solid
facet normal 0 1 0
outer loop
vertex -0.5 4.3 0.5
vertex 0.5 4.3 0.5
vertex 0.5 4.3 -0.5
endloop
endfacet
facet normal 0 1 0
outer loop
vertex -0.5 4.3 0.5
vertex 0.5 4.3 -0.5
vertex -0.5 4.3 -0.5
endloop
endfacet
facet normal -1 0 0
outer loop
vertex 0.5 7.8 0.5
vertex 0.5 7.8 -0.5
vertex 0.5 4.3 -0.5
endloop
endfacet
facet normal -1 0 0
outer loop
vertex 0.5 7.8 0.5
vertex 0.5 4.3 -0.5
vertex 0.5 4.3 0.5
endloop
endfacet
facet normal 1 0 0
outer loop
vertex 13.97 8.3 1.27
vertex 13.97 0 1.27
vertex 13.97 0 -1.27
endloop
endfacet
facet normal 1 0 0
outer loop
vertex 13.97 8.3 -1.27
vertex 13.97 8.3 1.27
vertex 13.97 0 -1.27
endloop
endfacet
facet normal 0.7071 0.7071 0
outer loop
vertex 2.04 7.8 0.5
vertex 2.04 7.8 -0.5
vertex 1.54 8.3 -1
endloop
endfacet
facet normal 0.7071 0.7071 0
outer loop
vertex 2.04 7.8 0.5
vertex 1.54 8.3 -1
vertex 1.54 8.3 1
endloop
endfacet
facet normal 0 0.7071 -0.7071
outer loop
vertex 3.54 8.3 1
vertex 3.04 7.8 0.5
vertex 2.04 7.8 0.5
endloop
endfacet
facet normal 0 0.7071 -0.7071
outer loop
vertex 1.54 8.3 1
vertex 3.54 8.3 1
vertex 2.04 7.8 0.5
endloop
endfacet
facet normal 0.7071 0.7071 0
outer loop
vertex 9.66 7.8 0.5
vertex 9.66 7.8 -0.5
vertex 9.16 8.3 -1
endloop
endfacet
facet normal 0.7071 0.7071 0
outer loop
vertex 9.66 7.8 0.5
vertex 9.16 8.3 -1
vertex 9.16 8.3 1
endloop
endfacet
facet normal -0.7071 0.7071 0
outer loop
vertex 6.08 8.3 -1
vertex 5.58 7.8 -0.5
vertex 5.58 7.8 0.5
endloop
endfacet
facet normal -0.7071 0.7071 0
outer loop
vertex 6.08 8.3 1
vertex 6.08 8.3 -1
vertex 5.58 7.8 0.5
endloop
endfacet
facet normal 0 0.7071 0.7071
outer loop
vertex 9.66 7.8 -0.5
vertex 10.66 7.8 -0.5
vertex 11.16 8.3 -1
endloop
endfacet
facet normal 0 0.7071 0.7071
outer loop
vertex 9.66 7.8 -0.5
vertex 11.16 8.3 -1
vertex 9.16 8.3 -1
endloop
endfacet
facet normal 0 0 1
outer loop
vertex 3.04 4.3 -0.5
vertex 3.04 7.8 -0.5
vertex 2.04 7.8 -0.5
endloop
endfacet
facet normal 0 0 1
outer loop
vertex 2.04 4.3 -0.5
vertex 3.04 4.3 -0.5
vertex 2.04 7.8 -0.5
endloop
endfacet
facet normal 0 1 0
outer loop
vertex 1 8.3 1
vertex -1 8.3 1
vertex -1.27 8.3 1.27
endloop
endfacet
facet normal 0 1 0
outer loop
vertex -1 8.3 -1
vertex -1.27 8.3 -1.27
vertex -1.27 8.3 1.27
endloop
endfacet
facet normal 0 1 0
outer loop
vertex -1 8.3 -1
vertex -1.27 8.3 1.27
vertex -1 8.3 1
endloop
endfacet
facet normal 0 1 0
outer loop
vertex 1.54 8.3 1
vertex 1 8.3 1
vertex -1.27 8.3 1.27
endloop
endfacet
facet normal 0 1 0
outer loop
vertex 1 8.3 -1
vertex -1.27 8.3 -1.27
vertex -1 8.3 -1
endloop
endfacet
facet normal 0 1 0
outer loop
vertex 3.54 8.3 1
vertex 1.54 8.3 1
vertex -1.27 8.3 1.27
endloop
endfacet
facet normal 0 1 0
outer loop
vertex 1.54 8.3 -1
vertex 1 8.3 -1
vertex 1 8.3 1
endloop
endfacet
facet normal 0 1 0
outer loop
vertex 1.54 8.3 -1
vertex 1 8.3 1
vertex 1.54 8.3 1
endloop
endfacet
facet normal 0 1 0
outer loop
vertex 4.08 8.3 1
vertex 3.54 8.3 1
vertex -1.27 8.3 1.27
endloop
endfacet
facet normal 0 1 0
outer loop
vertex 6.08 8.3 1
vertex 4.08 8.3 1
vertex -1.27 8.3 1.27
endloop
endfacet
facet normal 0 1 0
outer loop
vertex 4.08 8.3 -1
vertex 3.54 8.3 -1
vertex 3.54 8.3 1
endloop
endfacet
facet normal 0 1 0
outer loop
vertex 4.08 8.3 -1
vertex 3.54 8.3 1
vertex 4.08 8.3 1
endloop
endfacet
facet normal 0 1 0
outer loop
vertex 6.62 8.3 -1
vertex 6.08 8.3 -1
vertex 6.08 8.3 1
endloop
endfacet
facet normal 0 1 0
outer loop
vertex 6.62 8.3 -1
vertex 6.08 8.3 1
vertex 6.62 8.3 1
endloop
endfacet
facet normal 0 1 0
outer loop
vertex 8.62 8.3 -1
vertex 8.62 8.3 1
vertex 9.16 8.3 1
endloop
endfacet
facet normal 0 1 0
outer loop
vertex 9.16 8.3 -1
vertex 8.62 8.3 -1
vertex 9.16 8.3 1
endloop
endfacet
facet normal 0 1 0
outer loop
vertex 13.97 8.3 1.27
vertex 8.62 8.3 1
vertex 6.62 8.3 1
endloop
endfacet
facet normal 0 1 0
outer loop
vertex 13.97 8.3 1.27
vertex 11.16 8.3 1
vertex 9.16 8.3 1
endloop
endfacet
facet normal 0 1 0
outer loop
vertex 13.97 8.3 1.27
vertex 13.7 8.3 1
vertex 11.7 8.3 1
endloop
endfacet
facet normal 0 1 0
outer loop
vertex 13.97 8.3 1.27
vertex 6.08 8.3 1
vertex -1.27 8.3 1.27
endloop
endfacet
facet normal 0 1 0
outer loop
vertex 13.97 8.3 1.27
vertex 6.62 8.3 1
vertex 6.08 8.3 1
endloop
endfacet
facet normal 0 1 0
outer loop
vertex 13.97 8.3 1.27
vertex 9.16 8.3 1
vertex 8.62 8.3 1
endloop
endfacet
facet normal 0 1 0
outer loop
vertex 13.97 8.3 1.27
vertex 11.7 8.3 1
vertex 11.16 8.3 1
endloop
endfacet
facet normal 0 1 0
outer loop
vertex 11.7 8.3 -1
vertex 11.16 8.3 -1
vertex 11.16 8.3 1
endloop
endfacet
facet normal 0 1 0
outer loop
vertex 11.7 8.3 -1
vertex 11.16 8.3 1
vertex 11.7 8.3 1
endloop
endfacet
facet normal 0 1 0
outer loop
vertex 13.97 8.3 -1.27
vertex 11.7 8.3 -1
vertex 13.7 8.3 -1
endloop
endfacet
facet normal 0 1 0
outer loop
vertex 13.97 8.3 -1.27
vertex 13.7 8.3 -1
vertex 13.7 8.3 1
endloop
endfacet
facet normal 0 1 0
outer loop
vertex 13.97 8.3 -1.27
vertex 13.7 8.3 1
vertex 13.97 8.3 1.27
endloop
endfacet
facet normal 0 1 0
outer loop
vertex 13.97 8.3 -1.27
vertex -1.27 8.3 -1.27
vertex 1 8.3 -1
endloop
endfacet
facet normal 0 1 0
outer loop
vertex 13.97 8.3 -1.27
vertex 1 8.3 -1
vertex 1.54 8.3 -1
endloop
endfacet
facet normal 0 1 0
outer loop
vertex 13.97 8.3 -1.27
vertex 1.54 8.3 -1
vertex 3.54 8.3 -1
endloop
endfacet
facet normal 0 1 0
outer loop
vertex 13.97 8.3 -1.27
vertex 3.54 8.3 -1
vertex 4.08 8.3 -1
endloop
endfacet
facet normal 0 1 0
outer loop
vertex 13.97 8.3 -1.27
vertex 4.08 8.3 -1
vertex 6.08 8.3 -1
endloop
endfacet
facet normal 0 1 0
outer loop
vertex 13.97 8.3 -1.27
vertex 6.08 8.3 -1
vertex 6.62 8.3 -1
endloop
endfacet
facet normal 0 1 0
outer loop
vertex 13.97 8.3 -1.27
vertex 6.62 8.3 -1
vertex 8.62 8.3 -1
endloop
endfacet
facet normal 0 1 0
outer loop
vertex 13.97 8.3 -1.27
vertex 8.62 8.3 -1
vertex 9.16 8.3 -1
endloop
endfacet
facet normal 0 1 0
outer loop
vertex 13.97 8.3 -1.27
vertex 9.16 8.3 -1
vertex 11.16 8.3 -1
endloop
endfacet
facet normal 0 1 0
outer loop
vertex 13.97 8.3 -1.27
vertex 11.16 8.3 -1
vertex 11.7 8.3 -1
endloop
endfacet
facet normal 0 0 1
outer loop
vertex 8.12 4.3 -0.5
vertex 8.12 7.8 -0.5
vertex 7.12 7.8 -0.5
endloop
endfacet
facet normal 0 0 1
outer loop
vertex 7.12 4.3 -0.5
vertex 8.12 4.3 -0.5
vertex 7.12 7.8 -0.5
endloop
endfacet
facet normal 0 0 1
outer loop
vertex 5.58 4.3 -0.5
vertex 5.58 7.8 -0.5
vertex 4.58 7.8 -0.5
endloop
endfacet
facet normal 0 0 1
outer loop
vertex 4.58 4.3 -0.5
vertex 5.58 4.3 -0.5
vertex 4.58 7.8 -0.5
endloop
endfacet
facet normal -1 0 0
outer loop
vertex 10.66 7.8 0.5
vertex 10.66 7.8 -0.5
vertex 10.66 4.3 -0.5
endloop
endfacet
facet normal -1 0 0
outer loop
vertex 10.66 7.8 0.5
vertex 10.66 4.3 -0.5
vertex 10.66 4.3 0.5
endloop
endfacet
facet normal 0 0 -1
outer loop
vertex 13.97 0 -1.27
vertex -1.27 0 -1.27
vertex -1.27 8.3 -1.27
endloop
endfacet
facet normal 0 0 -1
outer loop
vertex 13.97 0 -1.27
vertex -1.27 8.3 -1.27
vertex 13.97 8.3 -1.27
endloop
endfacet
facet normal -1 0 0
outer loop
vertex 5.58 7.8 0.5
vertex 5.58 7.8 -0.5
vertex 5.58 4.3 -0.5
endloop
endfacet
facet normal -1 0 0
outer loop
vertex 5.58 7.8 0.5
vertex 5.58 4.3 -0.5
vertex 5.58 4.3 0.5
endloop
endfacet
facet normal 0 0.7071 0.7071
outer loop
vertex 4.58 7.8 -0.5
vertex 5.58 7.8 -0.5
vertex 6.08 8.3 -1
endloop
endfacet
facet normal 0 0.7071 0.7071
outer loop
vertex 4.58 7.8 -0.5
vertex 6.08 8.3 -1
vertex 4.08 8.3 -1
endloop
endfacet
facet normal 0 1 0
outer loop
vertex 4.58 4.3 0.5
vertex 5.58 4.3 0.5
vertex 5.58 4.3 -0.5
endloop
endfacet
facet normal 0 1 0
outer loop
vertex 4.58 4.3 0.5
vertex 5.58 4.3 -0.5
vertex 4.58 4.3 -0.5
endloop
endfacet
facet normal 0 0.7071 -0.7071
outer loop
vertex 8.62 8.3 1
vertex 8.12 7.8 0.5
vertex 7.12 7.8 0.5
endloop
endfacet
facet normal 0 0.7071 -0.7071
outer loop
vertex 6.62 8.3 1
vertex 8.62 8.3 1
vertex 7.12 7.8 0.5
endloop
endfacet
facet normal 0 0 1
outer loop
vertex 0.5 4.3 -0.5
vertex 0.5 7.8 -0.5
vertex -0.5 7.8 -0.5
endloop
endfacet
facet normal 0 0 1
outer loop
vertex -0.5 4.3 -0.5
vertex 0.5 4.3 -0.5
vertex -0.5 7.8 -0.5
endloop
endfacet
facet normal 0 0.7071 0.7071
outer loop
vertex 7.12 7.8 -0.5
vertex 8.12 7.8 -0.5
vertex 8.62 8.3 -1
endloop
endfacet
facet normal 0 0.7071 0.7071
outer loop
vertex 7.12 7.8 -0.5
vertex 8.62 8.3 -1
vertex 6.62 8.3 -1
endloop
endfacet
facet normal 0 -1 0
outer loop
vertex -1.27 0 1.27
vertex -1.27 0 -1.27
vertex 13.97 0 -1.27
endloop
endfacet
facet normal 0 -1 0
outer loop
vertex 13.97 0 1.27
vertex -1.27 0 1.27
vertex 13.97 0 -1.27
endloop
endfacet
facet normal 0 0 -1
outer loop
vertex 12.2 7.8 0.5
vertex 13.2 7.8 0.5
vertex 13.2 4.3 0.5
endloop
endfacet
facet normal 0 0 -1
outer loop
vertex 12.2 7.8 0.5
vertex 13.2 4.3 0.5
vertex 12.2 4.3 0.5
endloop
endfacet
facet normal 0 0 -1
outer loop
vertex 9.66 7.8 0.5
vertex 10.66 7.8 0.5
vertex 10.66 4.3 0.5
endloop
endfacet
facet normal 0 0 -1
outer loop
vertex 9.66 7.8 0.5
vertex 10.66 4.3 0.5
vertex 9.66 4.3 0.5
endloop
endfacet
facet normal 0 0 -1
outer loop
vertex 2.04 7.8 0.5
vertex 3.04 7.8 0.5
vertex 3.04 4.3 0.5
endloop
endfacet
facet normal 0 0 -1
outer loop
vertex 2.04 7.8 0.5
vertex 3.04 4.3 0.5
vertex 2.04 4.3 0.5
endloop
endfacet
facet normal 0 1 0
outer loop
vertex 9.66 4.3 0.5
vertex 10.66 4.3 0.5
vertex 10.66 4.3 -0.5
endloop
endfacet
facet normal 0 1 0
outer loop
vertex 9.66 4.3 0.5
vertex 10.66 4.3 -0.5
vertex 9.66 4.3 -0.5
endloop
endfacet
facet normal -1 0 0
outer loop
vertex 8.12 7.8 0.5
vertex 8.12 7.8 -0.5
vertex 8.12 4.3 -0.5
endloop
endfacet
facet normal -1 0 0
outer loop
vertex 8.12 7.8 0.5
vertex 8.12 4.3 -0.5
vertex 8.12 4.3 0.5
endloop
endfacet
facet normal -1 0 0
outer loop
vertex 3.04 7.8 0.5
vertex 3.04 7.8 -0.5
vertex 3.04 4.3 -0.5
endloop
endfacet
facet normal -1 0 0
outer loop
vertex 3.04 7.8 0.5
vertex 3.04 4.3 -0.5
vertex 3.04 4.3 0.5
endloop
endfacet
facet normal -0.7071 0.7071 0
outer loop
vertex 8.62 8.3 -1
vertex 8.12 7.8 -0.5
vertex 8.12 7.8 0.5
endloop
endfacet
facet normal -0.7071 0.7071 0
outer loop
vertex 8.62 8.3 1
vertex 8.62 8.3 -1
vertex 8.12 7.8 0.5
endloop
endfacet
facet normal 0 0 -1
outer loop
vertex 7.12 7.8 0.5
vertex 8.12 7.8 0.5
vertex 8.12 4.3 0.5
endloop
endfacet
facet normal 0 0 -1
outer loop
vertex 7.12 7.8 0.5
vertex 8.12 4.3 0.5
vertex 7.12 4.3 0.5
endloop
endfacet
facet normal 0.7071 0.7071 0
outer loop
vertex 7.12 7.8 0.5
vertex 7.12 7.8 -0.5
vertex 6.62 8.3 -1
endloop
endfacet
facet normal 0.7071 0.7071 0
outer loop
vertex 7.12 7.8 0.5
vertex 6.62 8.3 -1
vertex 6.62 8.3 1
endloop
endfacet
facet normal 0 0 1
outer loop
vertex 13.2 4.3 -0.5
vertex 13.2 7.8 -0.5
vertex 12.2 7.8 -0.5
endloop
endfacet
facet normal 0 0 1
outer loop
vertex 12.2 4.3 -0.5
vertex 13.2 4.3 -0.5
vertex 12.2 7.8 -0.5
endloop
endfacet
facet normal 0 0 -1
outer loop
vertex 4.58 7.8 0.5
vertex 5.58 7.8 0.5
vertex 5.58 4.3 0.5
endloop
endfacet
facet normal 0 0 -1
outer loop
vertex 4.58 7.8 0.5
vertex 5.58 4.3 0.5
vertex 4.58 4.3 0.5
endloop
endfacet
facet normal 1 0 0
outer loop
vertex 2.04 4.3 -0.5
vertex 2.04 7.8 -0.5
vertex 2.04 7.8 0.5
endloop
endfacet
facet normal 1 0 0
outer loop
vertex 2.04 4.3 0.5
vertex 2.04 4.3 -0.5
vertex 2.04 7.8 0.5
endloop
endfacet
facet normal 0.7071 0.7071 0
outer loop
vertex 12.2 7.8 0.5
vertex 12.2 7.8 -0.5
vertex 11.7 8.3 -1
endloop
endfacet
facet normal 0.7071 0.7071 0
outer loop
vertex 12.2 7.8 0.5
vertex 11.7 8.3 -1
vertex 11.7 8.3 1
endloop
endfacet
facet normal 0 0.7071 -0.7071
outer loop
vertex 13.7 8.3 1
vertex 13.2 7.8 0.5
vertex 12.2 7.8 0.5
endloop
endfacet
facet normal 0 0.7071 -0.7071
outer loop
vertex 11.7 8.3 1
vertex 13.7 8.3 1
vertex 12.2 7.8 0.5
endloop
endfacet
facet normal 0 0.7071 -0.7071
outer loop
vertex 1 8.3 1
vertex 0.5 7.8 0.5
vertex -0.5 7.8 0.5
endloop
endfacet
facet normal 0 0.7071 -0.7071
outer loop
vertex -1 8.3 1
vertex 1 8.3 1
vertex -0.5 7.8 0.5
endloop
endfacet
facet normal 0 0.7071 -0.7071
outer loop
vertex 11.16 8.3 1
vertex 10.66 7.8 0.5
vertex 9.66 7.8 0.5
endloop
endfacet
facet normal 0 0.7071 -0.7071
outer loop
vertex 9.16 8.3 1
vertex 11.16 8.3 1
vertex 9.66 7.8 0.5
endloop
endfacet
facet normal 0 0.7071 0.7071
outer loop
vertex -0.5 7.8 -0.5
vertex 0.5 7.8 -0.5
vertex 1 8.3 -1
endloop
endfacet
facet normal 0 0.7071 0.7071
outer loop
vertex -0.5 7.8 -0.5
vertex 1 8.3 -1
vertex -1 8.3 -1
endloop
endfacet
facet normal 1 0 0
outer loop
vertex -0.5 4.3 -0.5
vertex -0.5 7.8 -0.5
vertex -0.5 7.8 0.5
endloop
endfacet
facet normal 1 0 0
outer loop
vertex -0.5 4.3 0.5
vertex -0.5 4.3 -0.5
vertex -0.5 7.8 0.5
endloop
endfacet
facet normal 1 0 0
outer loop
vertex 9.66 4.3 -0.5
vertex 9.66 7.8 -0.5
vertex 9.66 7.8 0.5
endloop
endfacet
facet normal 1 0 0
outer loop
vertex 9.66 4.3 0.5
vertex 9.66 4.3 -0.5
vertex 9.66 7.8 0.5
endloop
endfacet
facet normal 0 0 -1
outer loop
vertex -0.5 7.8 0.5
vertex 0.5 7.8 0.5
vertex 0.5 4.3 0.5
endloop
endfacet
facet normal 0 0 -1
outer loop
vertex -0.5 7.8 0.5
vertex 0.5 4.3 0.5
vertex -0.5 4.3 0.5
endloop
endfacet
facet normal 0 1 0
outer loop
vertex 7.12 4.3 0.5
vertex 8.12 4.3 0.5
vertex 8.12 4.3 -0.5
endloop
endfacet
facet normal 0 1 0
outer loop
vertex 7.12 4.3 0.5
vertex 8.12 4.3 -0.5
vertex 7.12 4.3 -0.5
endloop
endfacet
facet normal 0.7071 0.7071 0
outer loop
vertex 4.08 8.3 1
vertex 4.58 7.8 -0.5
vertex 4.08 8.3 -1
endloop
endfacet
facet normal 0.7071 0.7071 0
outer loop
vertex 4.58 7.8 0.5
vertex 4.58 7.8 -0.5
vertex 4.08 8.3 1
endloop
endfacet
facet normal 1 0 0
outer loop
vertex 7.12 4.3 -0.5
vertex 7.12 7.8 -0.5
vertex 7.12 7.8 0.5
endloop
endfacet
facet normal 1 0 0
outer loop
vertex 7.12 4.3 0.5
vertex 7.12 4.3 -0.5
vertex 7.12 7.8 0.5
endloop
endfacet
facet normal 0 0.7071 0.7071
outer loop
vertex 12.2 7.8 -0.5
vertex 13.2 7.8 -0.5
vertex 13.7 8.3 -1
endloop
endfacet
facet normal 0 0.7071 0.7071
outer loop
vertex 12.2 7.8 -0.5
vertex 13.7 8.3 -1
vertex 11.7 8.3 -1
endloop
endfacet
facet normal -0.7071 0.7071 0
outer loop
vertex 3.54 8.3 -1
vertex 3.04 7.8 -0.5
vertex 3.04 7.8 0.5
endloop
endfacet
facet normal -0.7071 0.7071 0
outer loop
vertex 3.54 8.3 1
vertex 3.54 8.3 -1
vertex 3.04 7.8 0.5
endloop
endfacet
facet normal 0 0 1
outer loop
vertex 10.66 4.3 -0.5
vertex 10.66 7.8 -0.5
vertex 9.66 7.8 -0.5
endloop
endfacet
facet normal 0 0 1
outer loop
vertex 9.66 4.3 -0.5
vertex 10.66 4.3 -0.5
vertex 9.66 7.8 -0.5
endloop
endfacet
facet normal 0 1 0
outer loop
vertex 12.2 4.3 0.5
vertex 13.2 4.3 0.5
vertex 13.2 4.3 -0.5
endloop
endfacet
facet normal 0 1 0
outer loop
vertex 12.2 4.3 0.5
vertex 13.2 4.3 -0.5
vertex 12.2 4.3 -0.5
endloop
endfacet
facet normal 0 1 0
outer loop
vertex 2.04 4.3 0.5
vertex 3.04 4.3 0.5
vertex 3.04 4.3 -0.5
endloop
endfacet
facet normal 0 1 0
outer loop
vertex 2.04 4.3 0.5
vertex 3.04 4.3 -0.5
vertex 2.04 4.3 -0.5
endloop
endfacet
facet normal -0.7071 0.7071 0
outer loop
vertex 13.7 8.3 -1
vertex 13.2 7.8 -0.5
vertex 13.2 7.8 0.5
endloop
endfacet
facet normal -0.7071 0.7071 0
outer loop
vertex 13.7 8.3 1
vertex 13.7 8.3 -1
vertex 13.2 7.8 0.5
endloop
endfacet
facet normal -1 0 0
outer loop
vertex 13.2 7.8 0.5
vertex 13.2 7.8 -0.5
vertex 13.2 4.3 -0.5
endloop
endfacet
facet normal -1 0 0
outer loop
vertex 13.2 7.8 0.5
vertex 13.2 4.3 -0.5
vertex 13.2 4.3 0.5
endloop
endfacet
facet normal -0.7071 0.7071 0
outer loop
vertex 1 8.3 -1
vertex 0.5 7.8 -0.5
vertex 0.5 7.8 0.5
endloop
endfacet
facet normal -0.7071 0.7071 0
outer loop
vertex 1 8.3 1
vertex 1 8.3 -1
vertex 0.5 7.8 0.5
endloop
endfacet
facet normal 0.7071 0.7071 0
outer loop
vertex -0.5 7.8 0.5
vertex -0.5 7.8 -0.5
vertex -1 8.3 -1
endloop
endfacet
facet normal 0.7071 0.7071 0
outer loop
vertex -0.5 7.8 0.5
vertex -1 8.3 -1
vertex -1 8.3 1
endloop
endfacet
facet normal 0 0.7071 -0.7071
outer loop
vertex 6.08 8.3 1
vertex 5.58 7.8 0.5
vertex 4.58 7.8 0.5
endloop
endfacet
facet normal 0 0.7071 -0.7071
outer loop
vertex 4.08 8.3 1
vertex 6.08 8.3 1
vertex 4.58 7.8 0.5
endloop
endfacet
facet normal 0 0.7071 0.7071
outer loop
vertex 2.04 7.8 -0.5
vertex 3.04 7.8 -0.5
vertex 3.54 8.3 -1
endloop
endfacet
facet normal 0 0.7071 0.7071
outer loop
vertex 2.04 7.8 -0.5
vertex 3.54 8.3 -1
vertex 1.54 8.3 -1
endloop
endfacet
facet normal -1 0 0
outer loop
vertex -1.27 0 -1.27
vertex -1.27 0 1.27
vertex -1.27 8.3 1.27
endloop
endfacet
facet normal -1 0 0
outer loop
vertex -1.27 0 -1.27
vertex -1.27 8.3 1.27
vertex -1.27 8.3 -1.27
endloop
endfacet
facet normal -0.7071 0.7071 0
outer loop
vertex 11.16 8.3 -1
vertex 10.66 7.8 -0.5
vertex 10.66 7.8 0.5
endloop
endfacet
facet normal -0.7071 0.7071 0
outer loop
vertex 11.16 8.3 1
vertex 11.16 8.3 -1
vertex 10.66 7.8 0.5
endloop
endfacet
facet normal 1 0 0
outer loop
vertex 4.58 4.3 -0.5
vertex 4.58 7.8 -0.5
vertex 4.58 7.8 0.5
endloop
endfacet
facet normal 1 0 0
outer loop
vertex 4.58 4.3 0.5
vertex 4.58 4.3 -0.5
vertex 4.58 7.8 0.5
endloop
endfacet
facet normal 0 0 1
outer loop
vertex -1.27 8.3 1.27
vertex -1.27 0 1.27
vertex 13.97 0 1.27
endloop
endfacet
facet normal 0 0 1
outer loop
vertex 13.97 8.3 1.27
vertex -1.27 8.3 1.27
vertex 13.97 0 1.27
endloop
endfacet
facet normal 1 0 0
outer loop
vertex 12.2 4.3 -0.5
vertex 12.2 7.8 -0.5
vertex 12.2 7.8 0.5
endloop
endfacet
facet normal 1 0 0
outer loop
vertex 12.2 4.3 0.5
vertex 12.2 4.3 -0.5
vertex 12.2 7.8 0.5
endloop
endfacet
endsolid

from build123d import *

# Parameters (mm, degrees)
SKETCH1_W                  = 2.54
SKETCH1_H                  = 2.54
BOSS_EXTRUDE1_DEPTH        = 8.3
SKETCH2_W                  = 1
SKETCH2_H                  = 1
CUT_EXTRUDE1_DEPTH         = 4
CHAMFER1_SIZE              = 0.5
LPATTERN1_COUNT            = 6
LPATTERN1_PITCH            = 2.54
CHAMFER1_OF_LPATTERN1_SIZE = 0.5


with BuildPart() as part:
    # Sketch1 → Boss-Extrude1 (new body)
    with BuildSketch(Plane(origin=(0, 0, 0), x_dir=(1, 0, 0), z_dir=(0, 1, 0))):
        Rectangle(SKETCH1_W, SKETCH1_H)
    boss_extrude1 = extrude(amount=BOSS_EXTRUDE1_DEPTH)

    # Sketch2 → Cut-Extrude1 (cut)
    with BuildSketch(Plane(origin=(0, 8.3, 0), x_dir=(-1, 0, 0), z_dir=(0, 1, 0))):
        Rectangle(SKETCH2_W, SKETCH2_H)
    cut_extrude1 = extrude(amount=-CUT_EXTRUDE1_DEPTH, mode=Mode.SUBTRACT)

    # Chamfer1
    chamfer1_edges = [part.edges().sort_by_distance(p)[0] for p in [
        (0, 8.3, 0.5),
        (0.5, 8.3, 0),
        (0, 8.3, -0.5),
        (-0.5, 8.3, 0),
    ]]
    chamfer(chamfer1_edges, length=CHAMFER1_SIZE)

    # LPattern1: Boss-Extrude1, Cut-Extrude1 ×6
    with Locations(*[(i * LPATTERN1_PITCH, 0, 0) for i in range(1, LPATTERN1_COUNT)]):
        add(boss_extrude1)
        add(cut_extrude1, mode=Mode.SUBTRACT)

    # Chamfer1 of LPattern1
    chamfer1_of_lpattern1_edges = [part.edges().sort_by_distance(p)[0] for p in [
        (2.54, 8.3, 0.5),
        (3.04, 8.3, 0),
        (2.54, 8.3, -0.5),
        (2.04, 8.3, 0),
        (5.08, 8.3, 0.5),
        (5.58, 8.3, 0),
        (5.08, 8.3, -0.5),
        (4.58, 8.3, 0),
        (7.62, 8.3, 0.5),
        (8.12, 8.3, 0),
        (7.62, 8.3, -0.5),
        (7.12, 8.3, 0),
        (10.16, 8.3, 0.5),
        (10.66, 8.3, 0),
        (10.16, 8.3, -0.5),
        (9.66, 8.3, 0),
        (12.7, 8.3, 0.5),
        (13.2, 8.3, 0),
        (12.7, 8.3, -0.5),
        (12.2, 8.3, 0),
    ]]
    chamfer(chamfer1_of_lpattern1_edges, length=CHAMFER1_OF_LPATTERN1_SIZE)


solid = part.part
